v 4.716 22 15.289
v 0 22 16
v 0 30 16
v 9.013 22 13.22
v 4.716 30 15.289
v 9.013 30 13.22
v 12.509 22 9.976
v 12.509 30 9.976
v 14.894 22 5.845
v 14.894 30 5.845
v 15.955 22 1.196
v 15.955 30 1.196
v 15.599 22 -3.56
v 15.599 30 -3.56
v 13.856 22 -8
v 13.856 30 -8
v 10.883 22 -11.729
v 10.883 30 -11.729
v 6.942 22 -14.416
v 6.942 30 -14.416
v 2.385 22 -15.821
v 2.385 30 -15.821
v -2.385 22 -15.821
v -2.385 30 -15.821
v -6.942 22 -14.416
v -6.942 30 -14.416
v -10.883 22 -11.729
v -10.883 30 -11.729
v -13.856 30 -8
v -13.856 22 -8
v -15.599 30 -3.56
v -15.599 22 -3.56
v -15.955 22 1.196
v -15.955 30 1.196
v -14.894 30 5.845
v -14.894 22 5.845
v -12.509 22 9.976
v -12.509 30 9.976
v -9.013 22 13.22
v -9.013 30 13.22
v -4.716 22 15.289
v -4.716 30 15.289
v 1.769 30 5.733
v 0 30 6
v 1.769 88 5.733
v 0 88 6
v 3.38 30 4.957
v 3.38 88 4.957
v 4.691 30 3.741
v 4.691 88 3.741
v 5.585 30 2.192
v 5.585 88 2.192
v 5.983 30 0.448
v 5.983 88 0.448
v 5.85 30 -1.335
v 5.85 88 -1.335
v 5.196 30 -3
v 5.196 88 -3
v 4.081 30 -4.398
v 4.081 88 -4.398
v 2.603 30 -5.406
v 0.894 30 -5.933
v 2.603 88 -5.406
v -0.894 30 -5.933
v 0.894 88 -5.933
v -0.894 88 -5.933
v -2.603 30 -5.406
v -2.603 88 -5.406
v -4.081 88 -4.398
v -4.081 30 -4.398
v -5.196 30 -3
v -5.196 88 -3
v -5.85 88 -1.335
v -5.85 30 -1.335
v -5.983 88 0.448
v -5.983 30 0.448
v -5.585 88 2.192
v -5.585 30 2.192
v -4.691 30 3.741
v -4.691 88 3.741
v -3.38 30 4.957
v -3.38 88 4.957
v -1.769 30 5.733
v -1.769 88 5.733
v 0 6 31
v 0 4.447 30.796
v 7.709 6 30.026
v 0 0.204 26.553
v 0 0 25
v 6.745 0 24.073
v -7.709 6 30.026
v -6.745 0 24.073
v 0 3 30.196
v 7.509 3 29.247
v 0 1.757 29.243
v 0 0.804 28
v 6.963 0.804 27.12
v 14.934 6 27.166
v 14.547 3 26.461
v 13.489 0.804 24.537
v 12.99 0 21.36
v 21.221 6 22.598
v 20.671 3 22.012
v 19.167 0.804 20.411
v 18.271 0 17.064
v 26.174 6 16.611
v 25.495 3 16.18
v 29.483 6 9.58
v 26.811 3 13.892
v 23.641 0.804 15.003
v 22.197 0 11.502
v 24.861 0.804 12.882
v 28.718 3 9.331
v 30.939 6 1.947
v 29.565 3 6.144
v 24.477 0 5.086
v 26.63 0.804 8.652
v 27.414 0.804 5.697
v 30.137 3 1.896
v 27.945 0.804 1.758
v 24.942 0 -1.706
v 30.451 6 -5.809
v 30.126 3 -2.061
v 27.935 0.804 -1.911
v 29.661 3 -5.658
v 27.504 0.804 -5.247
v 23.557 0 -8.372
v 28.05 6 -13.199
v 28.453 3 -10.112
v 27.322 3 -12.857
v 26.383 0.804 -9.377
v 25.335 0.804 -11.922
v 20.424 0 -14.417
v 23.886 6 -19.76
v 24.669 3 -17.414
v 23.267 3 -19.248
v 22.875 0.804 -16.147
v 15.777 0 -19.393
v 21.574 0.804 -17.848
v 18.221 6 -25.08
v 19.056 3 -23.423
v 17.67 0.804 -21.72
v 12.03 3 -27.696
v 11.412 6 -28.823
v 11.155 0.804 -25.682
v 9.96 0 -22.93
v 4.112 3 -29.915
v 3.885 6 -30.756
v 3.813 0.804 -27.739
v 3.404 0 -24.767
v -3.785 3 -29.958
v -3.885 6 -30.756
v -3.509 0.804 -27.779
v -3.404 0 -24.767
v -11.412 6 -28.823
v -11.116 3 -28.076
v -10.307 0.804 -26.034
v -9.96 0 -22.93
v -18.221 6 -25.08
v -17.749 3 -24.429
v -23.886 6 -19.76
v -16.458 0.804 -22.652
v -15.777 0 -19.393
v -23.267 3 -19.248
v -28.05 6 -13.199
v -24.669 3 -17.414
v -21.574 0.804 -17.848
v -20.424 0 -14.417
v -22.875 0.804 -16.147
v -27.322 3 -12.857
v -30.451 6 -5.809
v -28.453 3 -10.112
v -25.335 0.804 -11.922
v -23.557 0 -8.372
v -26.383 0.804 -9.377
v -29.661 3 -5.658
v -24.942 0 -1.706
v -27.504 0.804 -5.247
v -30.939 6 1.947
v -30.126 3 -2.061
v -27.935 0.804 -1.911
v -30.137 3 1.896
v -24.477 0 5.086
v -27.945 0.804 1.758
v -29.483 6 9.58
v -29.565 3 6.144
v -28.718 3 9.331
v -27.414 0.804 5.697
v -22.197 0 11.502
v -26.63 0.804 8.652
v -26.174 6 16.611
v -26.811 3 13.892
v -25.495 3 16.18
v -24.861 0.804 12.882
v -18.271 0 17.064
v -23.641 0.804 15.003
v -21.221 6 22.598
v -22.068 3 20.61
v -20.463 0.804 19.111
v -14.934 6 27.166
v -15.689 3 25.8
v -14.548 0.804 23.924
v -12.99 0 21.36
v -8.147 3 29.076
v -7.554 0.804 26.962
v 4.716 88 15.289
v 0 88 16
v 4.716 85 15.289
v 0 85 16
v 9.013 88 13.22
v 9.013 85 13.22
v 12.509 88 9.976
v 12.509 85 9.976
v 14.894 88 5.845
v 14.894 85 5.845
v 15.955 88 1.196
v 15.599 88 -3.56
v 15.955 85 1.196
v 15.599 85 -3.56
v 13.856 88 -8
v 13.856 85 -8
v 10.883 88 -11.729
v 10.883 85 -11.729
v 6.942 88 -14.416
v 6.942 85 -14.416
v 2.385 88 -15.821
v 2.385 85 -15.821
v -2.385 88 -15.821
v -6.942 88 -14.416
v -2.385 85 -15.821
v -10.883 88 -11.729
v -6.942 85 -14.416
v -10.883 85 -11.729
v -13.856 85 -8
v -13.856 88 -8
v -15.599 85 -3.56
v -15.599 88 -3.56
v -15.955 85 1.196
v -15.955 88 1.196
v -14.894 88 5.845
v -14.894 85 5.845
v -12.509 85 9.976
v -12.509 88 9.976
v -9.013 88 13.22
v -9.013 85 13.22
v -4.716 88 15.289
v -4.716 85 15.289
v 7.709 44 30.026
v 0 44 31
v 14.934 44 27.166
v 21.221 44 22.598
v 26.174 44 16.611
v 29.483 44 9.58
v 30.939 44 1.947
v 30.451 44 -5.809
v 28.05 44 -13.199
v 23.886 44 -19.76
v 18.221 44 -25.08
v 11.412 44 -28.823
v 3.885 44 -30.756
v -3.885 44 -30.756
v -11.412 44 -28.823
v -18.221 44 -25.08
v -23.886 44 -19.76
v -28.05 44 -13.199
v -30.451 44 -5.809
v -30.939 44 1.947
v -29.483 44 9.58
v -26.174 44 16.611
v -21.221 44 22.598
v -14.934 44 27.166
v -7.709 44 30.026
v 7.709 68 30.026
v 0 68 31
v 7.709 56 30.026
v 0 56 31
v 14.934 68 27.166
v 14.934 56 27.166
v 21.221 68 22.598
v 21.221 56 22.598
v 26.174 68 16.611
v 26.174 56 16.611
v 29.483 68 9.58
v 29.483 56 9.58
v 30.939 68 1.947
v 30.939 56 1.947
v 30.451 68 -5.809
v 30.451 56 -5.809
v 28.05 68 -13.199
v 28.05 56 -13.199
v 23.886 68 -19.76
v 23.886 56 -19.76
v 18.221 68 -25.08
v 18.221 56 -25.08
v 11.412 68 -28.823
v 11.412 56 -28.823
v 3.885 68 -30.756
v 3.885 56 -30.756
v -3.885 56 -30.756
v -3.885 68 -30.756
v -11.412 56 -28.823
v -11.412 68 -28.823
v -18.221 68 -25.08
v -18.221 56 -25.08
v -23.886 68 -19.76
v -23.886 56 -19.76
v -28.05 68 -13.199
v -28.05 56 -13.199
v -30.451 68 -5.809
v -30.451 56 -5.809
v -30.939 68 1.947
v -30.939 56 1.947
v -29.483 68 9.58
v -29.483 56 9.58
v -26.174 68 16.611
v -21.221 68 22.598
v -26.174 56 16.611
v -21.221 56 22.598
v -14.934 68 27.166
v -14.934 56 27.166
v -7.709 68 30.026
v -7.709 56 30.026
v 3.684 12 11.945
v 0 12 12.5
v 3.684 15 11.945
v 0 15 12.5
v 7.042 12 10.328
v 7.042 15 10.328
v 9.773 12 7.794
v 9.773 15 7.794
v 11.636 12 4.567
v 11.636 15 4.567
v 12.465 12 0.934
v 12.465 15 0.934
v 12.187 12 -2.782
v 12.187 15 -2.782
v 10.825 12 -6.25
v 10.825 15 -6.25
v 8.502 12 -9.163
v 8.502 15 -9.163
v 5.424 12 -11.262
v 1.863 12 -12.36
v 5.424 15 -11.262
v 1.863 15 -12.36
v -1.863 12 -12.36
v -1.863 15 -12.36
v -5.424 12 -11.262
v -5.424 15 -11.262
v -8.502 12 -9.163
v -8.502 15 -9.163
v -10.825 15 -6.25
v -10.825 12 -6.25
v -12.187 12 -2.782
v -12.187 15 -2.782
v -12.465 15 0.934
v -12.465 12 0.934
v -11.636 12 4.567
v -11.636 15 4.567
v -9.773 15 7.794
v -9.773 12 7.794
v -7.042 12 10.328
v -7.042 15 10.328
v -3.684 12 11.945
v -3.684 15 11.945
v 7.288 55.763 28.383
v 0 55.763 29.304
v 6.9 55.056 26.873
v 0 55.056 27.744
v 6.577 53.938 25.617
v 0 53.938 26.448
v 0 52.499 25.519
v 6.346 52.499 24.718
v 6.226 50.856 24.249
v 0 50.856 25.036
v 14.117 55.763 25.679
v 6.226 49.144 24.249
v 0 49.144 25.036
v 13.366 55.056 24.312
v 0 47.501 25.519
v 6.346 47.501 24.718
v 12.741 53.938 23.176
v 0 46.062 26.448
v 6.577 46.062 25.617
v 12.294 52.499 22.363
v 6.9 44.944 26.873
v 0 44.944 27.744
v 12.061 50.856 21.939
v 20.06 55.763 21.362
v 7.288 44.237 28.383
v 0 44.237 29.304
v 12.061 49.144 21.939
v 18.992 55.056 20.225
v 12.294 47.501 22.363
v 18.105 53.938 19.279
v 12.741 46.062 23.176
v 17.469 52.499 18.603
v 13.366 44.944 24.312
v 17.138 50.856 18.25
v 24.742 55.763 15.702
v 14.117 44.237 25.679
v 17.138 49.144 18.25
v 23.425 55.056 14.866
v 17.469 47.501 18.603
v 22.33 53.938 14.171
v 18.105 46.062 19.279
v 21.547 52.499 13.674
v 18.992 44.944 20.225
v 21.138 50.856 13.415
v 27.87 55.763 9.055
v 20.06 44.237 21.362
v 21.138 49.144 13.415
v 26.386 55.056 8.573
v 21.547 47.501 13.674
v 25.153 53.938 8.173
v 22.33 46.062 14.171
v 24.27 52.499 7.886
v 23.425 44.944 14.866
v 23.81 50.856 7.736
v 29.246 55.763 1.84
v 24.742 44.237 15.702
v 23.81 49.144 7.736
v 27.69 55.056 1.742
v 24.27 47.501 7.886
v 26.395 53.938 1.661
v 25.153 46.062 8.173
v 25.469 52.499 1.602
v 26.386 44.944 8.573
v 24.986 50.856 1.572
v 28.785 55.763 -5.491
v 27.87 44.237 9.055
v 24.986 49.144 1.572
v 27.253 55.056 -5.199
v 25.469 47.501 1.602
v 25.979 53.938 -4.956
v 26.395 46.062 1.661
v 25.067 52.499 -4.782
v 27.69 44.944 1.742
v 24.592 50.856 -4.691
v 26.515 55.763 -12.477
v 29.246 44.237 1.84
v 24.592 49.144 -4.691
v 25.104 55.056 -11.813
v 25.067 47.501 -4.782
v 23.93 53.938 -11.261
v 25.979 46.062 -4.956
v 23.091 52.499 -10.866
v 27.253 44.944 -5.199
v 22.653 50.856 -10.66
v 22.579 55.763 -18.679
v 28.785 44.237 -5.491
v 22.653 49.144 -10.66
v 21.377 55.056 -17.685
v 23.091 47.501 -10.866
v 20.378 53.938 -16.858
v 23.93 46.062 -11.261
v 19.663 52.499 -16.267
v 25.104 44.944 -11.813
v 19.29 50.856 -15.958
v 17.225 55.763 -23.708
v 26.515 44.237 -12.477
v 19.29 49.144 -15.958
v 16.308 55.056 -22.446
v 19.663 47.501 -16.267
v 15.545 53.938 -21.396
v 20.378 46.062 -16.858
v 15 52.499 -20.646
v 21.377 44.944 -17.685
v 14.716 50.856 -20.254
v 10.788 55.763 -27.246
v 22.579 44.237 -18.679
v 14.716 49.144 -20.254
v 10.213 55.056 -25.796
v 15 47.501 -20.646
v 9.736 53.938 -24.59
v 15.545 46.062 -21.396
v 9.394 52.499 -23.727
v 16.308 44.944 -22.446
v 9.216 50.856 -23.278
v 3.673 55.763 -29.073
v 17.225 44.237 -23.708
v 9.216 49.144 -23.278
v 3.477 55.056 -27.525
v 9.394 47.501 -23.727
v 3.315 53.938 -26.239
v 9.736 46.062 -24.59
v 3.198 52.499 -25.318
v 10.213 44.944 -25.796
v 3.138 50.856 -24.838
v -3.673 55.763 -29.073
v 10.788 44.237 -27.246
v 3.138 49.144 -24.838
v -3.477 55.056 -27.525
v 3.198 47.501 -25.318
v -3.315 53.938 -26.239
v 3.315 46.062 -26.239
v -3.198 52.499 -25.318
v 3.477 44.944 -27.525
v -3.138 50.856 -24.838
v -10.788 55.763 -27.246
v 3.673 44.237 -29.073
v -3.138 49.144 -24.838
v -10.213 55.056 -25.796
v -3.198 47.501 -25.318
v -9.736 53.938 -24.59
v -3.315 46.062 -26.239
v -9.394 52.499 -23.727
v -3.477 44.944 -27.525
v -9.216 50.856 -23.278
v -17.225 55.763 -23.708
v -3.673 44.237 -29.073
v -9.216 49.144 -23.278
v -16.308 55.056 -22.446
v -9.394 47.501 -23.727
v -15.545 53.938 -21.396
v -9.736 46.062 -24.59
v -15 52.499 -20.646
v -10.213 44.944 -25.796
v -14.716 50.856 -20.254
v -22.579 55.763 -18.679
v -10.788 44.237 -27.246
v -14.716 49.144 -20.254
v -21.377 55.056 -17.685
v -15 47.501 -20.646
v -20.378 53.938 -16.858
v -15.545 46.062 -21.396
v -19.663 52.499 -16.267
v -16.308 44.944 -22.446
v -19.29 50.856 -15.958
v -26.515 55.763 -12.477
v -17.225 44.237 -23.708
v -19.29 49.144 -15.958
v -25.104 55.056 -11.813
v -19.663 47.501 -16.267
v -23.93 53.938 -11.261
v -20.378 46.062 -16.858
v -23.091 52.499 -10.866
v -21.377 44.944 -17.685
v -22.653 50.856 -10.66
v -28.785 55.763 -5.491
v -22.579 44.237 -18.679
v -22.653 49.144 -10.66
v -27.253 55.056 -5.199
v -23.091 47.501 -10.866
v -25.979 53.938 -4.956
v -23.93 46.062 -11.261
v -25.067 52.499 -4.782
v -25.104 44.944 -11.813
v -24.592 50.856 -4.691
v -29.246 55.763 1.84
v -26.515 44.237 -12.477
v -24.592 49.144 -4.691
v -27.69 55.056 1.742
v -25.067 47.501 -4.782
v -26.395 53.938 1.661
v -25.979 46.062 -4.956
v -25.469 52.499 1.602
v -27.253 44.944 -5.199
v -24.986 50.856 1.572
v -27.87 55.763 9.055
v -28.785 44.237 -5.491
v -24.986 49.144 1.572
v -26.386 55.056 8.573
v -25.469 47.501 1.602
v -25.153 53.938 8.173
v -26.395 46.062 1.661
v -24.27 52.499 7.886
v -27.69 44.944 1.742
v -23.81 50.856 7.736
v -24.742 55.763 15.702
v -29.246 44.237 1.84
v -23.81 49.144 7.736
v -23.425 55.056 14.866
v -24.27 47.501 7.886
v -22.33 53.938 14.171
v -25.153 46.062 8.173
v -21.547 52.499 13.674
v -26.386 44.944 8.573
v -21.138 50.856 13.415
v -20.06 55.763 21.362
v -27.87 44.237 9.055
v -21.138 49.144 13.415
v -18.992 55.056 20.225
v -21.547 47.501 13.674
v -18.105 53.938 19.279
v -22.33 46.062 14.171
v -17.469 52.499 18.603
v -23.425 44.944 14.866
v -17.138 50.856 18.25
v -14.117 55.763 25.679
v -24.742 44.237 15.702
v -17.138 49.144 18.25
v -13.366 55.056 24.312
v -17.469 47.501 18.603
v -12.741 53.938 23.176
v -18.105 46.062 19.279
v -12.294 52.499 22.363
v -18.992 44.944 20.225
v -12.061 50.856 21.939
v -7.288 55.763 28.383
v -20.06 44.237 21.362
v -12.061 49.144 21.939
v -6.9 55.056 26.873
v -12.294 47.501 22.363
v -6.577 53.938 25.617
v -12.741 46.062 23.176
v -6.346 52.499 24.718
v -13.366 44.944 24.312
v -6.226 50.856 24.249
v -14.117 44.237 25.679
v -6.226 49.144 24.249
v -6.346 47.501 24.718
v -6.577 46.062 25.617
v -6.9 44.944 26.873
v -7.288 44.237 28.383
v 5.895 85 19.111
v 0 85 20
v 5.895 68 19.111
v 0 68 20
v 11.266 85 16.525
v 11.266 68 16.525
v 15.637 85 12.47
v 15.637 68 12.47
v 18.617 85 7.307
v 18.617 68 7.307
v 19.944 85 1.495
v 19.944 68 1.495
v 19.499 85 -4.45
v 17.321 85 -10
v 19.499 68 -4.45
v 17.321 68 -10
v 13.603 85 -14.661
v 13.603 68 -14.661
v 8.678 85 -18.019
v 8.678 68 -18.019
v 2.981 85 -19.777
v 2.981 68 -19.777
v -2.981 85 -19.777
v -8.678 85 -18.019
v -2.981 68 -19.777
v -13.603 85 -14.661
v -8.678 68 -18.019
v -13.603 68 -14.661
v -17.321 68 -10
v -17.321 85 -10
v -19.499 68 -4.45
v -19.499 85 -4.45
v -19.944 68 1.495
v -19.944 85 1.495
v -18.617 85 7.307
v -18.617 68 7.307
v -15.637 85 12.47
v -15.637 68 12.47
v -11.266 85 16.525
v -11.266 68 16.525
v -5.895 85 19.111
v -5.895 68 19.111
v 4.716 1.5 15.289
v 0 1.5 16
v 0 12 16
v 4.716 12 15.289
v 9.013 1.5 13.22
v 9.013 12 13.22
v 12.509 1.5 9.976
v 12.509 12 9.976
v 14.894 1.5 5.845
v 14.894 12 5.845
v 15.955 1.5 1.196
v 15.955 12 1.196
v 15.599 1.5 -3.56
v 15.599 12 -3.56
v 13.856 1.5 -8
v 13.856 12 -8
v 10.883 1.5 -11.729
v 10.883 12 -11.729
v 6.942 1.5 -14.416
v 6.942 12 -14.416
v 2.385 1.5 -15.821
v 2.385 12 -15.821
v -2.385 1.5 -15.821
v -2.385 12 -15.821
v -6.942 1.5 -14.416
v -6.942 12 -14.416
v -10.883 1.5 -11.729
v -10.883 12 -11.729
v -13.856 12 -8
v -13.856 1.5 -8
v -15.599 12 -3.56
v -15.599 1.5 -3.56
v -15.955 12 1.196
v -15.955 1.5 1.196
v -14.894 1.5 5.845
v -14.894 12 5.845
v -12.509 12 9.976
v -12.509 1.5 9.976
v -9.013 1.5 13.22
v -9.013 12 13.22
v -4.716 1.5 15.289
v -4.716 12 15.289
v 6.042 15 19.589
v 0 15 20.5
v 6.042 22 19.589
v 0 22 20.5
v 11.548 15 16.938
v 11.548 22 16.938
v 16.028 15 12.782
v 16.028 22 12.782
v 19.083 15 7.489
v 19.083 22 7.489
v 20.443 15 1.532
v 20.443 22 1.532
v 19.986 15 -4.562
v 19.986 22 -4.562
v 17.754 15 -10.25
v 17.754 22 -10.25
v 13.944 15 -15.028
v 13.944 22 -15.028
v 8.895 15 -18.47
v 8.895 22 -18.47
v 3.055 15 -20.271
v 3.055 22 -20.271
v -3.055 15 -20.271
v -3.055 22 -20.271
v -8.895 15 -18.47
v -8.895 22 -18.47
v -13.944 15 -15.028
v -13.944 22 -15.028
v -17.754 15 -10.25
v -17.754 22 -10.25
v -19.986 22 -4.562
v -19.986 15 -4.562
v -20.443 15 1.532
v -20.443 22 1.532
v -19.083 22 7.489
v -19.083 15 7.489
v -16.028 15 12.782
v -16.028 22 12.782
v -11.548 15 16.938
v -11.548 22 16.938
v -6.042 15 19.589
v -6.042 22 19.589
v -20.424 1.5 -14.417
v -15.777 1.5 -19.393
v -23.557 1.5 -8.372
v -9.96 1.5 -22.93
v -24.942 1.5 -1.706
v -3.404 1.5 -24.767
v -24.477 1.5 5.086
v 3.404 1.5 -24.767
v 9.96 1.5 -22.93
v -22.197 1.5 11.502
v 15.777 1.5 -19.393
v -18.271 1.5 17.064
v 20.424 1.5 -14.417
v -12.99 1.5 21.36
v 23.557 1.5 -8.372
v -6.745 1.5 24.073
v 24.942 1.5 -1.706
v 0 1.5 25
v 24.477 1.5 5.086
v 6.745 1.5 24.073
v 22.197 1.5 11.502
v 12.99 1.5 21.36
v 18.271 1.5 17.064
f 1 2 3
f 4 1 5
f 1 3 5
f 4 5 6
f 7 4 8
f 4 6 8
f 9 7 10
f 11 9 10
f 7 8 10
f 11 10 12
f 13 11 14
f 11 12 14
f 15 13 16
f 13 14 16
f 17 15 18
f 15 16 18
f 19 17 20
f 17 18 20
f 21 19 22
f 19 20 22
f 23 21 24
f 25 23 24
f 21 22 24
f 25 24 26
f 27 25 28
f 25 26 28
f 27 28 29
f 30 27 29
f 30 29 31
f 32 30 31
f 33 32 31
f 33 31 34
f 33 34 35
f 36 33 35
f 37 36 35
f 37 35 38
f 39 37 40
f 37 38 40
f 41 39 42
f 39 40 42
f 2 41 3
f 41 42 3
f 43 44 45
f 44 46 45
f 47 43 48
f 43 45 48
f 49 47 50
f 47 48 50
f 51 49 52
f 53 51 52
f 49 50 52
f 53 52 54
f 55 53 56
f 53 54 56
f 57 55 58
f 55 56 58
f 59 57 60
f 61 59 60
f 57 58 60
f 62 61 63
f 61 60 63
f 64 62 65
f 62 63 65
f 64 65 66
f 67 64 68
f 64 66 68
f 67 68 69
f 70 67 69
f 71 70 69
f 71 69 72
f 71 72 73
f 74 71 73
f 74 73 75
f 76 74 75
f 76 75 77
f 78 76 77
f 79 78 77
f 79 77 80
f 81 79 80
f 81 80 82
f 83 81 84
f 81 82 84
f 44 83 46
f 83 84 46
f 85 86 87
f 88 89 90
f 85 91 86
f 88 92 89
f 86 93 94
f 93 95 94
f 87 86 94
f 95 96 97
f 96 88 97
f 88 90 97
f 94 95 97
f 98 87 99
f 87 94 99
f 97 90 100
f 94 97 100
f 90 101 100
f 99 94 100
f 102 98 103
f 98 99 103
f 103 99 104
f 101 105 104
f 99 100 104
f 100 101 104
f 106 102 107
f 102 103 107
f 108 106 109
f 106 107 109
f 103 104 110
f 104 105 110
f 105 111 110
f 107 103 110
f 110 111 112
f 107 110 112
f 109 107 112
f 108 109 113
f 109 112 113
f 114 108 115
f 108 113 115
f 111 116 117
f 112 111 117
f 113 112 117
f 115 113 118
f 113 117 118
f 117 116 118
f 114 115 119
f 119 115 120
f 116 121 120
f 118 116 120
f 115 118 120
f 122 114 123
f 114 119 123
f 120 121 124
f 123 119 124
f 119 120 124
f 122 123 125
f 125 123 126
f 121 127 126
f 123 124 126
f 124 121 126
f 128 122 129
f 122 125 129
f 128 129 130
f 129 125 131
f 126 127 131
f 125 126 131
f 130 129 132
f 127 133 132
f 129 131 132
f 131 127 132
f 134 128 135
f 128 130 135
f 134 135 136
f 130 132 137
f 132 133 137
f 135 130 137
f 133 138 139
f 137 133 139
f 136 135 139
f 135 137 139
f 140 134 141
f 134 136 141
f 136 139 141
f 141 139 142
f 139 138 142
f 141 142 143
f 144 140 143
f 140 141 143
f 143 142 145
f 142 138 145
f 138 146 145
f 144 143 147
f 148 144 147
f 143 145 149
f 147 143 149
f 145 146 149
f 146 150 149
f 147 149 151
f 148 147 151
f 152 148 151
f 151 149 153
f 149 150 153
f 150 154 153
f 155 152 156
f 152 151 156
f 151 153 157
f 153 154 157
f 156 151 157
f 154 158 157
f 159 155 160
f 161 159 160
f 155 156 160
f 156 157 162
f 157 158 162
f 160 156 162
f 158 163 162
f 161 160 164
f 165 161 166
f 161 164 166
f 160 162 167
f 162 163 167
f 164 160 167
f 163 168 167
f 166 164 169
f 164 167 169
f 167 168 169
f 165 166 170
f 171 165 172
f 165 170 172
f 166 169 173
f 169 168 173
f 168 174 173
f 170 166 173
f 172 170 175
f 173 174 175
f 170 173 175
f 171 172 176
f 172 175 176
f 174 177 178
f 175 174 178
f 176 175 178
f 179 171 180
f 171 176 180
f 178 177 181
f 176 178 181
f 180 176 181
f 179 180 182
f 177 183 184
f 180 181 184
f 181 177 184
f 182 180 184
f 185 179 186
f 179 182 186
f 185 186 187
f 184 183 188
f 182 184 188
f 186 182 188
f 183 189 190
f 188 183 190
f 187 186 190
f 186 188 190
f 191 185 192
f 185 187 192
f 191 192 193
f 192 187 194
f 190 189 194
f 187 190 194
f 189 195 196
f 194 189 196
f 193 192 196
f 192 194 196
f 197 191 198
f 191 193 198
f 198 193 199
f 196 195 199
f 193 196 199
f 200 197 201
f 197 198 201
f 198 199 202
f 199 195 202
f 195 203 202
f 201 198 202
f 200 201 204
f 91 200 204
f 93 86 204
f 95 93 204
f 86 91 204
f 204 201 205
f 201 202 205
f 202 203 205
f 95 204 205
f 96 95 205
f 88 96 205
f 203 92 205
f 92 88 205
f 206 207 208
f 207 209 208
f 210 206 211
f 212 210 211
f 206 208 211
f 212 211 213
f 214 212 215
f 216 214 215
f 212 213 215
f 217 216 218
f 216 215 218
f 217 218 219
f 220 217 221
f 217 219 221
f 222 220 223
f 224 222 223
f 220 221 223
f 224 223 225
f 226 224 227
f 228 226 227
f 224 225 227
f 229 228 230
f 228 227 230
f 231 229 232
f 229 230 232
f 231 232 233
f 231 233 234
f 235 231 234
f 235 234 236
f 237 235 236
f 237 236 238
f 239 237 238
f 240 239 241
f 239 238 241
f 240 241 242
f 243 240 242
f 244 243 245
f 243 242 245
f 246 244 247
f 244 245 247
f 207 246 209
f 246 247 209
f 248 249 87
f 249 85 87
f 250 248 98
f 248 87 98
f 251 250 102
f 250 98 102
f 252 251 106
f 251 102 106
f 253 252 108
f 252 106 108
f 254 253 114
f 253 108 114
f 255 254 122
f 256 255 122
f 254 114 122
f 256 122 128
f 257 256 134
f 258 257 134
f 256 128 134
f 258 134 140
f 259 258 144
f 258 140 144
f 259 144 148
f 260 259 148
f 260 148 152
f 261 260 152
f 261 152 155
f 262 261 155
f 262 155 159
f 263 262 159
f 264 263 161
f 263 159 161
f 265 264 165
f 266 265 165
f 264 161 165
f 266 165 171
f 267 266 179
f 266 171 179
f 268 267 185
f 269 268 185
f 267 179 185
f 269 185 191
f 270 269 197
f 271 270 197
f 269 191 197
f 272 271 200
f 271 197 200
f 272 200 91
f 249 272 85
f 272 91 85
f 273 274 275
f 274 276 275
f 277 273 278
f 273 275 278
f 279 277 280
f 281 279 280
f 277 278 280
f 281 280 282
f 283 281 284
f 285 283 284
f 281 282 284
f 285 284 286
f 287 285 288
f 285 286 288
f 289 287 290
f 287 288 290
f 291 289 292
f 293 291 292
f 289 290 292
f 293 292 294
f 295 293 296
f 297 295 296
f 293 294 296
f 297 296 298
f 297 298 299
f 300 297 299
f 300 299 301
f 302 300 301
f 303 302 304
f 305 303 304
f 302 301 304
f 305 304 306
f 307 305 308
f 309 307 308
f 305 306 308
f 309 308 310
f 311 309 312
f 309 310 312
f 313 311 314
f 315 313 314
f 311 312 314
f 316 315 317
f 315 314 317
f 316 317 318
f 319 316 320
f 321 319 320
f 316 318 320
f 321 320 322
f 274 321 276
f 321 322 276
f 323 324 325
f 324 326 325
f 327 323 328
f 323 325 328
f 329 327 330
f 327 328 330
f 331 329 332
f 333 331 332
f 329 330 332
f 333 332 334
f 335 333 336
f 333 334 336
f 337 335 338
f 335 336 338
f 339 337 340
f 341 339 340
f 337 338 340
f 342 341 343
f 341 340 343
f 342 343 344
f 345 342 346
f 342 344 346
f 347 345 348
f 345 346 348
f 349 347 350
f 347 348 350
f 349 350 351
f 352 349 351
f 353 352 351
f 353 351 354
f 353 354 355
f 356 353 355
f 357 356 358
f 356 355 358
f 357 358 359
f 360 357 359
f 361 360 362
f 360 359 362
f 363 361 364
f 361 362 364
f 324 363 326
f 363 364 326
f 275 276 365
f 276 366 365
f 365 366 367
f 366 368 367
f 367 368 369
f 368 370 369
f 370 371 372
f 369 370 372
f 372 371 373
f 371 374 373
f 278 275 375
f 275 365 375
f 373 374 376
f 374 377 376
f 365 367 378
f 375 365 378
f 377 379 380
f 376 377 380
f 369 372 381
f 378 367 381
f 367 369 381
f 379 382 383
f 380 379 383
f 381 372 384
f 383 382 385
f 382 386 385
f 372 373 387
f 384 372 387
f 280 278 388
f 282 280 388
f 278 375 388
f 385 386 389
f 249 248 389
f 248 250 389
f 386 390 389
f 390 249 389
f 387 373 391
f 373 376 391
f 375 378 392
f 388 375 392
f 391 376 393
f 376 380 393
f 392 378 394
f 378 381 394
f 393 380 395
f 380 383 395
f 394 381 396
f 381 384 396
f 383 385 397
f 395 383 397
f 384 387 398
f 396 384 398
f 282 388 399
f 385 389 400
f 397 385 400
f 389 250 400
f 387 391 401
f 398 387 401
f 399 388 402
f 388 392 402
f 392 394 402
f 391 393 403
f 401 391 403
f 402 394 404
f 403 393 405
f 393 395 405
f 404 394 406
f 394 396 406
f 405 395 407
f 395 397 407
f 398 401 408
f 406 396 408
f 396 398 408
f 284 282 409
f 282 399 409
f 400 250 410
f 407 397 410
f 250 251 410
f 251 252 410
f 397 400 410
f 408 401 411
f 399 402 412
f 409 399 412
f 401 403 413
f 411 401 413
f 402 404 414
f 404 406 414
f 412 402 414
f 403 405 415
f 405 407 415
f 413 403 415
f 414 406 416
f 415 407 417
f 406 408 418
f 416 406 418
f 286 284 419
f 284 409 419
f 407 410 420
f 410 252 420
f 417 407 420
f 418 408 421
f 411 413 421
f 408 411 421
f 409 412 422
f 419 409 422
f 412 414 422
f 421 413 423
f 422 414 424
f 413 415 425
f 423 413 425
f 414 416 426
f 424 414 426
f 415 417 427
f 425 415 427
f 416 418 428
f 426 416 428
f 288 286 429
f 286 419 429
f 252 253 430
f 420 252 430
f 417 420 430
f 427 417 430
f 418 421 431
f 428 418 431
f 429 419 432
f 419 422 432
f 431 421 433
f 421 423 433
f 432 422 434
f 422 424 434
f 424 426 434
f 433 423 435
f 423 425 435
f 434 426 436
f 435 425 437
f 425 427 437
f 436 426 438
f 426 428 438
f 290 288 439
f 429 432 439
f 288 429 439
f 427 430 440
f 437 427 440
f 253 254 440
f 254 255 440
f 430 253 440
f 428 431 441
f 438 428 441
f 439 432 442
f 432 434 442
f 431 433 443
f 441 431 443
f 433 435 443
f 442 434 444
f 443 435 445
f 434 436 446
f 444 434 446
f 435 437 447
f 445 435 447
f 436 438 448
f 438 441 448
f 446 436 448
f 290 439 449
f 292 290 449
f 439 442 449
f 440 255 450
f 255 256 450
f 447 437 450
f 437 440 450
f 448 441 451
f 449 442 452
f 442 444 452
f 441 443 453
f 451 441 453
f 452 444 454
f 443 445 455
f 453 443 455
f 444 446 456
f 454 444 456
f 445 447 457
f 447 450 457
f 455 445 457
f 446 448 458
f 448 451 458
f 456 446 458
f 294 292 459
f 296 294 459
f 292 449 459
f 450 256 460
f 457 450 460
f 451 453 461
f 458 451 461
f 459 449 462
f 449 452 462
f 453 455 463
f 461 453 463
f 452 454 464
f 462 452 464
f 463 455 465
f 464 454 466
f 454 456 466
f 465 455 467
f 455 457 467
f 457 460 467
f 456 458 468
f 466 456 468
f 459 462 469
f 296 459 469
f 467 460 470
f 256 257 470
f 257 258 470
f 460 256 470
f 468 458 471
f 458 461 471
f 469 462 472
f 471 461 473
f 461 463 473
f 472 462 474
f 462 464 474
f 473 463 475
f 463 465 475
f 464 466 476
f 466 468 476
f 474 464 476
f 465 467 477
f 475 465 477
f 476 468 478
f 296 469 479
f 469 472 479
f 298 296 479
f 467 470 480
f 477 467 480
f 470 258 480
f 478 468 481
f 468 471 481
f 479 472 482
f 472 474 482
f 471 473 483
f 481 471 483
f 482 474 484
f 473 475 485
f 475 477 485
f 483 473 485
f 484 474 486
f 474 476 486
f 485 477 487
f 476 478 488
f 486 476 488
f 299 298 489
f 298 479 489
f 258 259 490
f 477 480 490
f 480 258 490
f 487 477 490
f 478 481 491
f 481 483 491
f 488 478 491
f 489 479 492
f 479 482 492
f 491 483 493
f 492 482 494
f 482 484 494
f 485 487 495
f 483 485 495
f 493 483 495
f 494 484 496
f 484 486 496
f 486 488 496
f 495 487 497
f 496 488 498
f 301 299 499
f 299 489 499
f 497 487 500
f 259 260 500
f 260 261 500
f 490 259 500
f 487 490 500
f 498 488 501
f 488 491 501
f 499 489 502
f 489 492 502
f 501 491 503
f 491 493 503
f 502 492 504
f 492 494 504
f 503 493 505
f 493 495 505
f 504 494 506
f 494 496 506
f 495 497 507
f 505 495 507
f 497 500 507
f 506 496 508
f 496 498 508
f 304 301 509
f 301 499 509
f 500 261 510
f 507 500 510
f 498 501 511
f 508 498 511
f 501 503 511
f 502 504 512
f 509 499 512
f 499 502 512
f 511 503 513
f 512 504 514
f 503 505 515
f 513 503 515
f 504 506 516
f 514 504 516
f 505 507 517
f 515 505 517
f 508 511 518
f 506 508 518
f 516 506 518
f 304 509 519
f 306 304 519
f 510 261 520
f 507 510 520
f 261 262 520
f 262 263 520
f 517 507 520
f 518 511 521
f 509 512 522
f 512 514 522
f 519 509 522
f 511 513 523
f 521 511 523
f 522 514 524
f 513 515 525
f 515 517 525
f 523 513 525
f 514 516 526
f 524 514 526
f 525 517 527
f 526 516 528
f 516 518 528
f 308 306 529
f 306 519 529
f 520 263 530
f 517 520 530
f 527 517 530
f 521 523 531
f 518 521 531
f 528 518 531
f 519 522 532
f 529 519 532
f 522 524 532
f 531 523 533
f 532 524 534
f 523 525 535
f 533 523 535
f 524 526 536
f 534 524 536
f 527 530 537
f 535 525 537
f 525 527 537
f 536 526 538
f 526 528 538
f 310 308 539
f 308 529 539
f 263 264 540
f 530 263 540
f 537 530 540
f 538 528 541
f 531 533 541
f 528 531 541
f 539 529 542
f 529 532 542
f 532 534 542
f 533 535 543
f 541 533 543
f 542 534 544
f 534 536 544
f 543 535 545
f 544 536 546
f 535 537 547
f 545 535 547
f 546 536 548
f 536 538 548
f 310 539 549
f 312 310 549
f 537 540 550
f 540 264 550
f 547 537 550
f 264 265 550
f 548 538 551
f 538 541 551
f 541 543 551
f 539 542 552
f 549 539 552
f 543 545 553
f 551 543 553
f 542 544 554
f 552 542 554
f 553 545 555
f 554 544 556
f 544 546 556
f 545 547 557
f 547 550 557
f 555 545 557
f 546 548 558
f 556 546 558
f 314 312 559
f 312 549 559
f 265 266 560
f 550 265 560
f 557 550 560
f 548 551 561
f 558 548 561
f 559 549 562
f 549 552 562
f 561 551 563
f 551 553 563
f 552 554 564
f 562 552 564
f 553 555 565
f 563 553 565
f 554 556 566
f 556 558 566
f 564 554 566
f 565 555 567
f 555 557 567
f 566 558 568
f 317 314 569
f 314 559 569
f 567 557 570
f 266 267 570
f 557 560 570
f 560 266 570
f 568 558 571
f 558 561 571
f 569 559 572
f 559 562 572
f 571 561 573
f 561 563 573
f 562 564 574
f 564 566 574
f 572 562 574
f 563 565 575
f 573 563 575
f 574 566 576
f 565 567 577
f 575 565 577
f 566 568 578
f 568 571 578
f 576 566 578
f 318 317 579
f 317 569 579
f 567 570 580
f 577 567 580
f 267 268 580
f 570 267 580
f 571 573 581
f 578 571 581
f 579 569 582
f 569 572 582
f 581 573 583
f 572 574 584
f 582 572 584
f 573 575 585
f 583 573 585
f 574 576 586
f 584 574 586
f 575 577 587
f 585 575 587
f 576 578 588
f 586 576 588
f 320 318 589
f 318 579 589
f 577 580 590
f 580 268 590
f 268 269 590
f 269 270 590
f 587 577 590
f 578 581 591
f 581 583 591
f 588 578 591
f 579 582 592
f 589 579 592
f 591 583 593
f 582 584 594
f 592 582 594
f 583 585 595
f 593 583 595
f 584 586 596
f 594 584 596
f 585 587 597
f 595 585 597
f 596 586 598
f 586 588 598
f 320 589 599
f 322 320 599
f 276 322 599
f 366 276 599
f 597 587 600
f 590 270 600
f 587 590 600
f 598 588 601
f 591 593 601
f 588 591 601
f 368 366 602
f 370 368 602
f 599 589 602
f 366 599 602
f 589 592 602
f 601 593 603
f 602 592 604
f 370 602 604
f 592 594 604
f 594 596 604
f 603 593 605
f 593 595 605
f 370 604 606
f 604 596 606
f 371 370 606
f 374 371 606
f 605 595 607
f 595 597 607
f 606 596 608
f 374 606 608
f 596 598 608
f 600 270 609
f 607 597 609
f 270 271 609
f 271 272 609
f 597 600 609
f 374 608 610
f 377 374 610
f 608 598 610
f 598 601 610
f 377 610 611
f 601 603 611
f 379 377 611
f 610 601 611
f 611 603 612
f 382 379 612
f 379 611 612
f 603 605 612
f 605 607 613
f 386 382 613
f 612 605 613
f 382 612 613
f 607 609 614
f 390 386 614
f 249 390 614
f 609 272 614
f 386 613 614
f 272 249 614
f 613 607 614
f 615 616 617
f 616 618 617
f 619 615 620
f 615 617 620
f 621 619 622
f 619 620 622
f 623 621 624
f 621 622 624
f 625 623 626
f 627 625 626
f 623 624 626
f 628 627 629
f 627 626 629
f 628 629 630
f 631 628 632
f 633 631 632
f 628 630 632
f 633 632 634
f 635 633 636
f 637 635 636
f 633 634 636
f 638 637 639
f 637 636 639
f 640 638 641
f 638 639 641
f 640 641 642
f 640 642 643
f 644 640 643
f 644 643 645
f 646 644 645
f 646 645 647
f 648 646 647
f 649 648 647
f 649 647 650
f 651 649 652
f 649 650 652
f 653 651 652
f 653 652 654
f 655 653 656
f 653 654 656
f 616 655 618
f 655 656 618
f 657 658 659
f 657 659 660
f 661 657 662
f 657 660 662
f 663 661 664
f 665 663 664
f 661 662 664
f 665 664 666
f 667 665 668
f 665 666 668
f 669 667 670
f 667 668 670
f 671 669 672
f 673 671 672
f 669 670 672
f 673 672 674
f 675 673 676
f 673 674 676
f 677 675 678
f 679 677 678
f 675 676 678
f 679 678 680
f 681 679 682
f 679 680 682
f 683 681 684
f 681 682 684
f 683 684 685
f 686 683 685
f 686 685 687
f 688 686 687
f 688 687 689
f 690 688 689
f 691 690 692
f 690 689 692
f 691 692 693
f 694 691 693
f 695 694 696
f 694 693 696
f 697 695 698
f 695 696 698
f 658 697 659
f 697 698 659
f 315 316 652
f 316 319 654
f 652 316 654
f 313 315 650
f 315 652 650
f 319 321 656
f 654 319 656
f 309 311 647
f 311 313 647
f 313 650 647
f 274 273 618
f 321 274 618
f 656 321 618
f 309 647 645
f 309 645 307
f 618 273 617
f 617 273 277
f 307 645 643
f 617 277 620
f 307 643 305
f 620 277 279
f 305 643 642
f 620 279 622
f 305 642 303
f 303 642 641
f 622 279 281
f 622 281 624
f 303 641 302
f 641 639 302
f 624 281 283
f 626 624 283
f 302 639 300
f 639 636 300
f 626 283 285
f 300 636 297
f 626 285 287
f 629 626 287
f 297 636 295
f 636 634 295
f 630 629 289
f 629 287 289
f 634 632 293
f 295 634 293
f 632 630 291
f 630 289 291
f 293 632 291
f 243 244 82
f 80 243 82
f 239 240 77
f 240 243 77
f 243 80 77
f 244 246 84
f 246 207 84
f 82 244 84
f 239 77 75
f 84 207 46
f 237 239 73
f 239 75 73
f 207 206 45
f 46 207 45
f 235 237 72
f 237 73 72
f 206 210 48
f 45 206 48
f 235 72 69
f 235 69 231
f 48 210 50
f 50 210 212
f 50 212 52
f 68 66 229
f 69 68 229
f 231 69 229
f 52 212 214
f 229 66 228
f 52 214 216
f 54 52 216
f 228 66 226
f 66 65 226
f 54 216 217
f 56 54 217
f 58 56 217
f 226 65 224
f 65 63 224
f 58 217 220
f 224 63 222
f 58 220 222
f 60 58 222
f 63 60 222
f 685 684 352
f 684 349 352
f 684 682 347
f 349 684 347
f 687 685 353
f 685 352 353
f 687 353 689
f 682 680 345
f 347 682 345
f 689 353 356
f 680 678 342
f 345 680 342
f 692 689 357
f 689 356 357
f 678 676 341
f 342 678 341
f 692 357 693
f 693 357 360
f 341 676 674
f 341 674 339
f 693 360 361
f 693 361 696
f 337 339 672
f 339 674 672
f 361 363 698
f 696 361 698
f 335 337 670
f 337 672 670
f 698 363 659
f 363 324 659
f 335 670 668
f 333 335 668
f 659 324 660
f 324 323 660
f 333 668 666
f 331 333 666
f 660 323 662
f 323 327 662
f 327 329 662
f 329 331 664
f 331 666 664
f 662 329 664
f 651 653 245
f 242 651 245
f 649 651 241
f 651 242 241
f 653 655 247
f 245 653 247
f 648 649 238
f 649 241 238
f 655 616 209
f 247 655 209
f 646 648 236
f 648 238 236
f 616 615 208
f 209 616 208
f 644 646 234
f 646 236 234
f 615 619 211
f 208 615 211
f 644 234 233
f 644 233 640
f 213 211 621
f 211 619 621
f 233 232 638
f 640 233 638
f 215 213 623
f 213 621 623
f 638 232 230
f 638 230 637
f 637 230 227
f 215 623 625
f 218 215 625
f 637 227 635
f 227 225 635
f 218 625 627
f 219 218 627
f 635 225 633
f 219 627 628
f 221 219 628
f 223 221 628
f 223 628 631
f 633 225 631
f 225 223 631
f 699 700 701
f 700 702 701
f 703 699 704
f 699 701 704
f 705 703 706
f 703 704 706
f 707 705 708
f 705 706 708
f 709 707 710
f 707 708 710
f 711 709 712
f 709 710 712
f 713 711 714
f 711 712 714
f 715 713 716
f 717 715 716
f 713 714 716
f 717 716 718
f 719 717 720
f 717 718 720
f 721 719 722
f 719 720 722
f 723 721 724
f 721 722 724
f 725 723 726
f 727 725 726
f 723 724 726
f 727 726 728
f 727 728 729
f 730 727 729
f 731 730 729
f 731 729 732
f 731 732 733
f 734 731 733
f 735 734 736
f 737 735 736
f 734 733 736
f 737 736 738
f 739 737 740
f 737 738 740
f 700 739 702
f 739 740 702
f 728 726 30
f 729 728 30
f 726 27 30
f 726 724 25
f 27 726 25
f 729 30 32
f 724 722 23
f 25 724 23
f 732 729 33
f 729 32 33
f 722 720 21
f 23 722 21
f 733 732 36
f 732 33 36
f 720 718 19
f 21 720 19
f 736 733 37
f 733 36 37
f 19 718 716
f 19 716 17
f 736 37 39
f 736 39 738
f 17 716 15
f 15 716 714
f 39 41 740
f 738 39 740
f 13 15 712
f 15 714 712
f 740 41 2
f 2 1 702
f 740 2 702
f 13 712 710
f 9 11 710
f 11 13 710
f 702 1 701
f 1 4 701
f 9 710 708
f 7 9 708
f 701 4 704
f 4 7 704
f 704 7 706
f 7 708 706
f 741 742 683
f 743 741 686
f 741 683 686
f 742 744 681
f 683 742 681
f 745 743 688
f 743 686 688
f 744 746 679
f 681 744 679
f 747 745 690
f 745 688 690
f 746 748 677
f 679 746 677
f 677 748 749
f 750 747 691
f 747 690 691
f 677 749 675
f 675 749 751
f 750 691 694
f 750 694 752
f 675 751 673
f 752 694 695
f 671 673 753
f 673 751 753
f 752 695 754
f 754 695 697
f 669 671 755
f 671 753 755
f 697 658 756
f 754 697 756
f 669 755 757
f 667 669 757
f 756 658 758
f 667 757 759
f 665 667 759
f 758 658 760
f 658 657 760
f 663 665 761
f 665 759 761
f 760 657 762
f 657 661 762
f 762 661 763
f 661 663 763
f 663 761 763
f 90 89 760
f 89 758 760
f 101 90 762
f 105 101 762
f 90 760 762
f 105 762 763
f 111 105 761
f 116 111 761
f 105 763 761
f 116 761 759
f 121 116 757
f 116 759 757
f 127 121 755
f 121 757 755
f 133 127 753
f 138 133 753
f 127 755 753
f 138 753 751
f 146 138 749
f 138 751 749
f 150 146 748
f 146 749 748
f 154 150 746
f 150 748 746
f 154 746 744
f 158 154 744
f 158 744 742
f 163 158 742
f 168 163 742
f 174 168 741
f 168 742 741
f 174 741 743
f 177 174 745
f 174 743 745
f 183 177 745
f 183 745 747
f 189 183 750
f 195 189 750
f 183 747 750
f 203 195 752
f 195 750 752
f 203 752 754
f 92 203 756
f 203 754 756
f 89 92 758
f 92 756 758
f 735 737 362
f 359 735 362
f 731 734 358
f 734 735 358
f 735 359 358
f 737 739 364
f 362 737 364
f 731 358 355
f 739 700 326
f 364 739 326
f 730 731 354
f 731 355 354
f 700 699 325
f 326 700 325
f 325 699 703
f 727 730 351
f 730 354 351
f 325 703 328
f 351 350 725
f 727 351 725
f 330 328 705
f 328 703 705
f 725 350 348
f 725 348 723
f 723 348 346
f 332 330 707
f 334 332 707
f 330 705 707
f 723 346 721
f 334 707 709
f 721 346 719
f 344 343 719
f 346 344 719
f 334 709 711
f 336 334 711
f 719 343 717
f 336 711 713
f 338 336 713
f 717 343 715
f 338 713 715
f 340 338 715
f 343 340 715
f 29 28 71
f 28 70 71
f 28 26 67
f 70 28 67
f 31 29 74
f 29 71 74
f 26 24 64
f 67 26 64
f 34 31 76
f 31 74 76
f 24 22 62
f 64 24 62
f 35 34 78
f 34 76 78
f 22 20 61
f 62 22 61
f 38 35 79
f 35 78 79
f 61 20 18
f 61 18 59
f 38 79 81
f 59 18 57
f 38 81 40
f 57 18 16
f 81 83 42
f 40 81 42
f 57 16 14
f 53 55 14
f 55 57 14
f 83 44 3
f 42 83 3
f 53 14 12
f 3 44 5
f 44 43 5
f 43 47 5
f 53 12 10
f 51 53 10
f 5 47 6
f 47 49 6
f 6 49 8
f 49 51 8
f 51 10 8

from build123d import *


with BuildPart() as f1:
    # F0 (on Right) → F1 (revolve)
    with BuildSketch(Plane.YZ):
        with BuildLine():
            Line((44, 31), (6, 31))
            ThreePointArc((6, 31), (1.757359, 29.242641), (0, 25))
            Line((0, 25), (1.5, 25))
            Line((1.5, 25), (1.5, 16))
            Line((1.5, 16), (12, 16))
            Line((12, 16), (12, 12.5))
            Line((12, 12.5), (15, 12.5))
            Line((15, 12.5), (15, 20.5))
            Line((15, 20.5), (22, 20.5))
            Line((22, 20.5), (22, 16))
            Line((22, 16), (30, 16))
            Line((30, 16), (30, 6))
            Line((30, 6), (88, 6))
            Line((88, 6), (88, 16))
            Line((88, 16), (85, 16))
            Line((85, 16), (85, 20))
            Line((85, 20), (68, 20))
            Line((68, 20), (68, 31))
            Line((68, 31), (56, 31))
            ThreePointArc((56, 31), (50, 24.974378), (44, 31))
        make_face()
    revolve(axis=Axis((0, 44, 0), (0, 1, 0)))


solid = f1.part
